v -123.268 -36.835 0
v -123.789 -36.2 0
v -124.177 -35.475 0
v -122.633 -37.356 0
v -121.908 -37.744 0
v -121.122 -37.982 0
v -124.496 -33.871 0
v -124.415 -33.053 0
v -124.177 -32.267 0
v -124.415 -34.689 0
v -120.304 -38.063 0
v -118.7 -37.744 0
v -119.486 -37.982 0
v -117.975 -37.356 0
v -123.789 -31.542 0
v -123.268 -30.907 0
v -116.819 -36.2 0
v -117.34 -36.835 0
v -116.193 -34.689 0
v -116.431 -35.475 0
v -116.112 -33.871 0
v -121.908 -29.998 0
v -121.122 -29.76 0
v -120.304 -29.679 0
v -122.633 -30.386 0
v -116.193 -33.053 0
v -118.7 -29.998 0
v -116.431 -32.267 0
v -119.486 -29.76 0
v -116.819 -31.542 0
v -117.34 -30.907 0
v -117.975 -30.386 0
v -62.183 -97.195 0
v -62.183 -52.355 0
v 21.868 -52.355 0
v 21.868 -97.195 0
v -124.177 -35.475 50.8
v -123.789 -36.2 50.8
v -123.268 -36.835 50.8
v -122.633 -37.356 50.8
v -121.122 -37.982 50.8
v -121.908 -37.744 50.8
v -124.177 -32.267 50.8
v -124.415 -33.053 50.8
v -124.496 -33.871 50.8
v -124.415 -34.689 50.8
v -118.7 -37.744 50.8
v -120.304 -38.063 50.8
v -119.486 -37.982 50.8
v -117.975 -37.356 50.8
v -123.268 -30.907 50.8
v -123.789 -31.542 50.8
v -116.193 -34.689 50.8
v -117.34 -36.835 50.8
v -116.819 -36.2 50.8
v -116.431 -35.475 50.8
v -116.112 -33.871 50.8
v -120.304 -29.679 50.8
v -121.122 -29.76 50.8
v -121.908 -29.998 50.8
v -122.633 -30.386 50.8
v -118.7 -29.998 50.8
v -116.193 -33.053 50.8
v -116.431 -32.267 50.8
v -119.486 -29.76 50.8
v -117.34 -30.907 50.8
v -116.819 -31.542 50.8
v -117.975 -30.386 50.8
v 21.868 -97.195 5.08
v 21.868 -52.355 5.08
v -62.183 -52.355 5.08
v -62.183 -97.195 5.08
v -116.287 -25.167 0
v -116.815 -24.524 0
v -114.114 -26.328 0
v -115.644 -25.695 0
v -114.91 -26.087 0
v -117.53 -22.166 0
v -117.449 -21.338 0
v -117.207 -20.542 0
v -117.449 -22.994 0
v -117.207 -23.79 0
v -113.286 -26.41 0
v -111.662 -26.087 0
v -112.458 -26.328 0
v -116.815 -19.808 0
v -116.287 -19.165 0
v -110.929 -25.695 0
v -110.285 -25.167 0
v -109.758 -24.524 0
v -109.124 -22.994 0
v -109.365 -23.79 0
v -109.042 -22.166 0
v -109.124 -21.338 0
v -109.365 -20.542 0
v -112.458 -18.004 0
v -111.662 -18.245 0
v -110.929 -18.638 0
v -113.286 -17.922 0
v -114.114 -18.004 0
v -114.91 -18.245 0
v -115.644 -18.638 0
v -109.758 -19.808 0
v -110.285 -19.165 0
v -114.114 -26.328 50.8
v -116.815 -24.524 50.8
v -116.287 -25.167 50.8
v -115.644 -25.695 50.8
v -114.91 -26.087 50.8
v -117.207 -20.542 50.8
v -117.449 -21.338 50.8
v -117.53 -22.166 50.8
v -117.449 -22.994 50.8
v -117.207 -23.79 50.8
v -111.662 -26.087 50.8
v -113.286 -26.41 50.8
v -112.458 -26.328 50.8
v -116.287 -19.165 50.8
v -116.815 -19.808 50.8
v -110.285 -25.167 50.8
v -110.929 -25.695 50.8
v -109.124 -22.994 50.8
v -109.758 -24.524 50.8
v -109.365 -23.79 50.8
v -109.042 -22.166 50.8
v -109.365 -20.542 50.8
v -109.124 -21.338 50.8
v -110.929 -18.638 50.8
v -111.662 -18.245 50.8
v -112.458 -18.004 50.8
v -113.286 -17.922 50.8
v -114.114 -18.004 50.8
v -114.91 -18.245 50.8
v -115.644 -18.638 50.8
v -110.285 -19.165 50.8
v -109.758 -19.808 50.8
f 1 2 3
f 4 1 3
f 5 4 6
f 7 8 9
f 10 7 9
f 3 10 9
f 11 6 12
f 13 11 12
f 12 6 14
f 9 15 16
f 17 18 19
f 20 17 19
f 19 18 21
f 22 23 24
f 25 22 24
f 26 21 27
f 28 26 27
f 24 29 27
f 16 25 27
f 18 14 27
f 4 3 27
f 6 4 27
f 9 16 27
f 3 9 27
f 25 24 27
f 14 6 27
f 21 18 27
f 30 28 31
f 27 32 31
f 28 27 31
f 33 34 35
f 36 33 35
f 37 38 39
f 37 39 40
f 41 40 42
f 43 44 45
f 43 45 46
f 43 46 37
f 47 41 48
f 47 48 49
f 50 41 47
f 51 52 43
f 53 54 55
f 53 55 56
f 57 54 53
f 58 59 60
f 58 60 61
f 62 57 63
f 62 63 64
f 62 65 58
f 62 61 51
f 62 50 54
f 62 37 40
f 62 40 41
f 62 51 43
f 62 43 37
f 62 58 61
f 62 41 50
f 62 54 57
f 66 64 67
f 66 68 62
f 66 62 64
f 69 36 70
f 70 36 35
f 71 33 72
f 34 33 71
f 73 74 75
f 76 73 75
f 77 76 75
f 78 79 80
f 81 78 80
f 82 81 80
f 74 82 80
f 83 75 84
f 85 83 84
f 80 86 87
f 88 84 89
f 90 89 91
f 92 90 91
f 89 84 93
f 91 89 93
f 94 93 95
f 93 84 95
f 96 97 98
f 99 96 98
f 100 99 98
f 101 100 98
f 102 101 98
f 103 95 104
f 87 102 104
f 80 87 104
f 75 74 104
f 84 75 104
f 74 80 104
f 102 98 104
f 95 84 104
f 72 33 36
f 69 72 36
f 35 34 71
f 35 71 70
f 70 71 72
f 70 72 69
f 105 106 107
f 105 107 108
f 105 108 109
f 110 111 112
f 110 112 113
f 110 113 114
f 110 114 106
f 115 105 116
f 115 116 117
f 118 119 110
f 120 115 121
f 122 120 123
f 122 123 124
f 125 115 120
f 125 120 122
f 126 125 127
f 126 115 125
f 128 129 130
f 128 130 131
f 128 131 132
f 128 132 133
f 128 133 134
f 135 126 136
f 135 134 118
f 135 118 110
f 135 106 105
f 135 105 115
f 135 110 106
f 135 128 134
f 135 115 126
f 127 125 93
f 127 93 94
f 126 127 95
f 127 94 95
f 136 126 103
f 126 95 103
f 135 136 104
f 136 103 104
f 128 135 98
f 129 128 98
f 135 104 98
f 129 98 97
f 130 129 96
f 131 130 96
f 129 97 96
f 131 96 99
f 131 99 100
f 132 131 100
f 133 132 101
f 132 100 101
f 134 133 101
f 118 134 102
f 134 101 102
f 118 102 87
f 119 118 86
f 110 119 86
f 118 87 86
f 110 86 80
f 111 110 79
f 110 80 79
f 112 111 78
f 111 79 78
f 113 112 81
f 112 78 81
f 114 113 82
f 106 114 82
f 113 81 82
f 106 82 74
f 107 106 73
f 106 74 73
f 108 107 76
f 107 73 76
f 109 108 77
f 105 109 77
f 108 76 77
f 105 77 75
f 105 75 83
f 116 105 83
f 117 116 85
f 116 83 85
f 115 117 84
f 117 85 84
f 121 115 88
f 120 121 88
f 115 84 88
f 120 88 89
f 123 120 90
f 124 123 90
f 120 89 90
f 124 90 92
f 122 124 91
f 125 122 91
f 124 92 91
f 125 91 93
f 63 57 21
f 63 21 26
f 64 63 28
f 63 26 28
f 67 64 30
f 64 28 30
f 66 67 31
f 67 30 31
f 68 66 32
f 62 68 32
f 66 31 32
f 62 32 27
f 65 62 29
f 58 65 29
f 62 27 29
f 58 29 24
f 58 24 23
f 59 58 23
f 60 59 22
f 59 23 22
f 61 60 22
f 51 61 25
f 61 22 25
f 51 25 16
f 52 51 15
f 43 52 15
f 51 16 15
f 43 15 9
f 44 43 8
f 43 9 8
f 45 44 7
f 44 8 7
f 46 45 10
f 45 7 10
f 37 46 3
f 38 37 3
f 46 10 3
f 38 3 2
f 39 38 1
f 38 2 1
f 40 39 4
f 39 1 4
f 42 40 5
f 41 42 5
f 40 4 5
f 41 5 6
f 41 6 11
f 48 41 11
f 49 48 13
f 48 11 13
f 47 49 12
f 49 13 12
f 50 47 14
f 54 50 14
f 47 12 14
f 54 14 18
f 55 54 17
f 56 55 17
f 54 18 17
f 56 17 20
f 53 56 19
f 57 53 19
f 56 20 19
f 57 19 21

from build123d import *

# Parameters (mm, degrees)
F0_R     = 4.191738
F1_DEPTH = 50.8
F2_W     = 84.051494
F2_H     = 44.839967
F3_DEPTH = 5.08
F4_R     = 4.243817
F5_DEPTH = 50.8


with BuildPart() as f1:
    # F0 (on Top) → F1 (new body)
    with BuildSketch(Plane.XY):
        with Locations((-120.303981, -33.870894)):
            Circle(F0_R)
    extrude(amount=F1_DEPTH)


with BuildPart() as f3:
    # F2 (on Top) → F3 (new body)
    with BuildSketch(Plane.XY):
        with Locations((-20.157313, -74.775433)):
            Rectangle(F2_W, F2_H)
    extrude(amount=F3_DEPTH)


with BuildPart() as f5:
    # F4 (on Top) → F5 (new body)
    with BuildSketch(Plane.XY):
        with Locations((-113.286242, -22.166153)):
            Circle(F4_R)
    extrude(amount=F5_DEPTH)


solid = Compound([f1.part, f3.part, f5.part])
